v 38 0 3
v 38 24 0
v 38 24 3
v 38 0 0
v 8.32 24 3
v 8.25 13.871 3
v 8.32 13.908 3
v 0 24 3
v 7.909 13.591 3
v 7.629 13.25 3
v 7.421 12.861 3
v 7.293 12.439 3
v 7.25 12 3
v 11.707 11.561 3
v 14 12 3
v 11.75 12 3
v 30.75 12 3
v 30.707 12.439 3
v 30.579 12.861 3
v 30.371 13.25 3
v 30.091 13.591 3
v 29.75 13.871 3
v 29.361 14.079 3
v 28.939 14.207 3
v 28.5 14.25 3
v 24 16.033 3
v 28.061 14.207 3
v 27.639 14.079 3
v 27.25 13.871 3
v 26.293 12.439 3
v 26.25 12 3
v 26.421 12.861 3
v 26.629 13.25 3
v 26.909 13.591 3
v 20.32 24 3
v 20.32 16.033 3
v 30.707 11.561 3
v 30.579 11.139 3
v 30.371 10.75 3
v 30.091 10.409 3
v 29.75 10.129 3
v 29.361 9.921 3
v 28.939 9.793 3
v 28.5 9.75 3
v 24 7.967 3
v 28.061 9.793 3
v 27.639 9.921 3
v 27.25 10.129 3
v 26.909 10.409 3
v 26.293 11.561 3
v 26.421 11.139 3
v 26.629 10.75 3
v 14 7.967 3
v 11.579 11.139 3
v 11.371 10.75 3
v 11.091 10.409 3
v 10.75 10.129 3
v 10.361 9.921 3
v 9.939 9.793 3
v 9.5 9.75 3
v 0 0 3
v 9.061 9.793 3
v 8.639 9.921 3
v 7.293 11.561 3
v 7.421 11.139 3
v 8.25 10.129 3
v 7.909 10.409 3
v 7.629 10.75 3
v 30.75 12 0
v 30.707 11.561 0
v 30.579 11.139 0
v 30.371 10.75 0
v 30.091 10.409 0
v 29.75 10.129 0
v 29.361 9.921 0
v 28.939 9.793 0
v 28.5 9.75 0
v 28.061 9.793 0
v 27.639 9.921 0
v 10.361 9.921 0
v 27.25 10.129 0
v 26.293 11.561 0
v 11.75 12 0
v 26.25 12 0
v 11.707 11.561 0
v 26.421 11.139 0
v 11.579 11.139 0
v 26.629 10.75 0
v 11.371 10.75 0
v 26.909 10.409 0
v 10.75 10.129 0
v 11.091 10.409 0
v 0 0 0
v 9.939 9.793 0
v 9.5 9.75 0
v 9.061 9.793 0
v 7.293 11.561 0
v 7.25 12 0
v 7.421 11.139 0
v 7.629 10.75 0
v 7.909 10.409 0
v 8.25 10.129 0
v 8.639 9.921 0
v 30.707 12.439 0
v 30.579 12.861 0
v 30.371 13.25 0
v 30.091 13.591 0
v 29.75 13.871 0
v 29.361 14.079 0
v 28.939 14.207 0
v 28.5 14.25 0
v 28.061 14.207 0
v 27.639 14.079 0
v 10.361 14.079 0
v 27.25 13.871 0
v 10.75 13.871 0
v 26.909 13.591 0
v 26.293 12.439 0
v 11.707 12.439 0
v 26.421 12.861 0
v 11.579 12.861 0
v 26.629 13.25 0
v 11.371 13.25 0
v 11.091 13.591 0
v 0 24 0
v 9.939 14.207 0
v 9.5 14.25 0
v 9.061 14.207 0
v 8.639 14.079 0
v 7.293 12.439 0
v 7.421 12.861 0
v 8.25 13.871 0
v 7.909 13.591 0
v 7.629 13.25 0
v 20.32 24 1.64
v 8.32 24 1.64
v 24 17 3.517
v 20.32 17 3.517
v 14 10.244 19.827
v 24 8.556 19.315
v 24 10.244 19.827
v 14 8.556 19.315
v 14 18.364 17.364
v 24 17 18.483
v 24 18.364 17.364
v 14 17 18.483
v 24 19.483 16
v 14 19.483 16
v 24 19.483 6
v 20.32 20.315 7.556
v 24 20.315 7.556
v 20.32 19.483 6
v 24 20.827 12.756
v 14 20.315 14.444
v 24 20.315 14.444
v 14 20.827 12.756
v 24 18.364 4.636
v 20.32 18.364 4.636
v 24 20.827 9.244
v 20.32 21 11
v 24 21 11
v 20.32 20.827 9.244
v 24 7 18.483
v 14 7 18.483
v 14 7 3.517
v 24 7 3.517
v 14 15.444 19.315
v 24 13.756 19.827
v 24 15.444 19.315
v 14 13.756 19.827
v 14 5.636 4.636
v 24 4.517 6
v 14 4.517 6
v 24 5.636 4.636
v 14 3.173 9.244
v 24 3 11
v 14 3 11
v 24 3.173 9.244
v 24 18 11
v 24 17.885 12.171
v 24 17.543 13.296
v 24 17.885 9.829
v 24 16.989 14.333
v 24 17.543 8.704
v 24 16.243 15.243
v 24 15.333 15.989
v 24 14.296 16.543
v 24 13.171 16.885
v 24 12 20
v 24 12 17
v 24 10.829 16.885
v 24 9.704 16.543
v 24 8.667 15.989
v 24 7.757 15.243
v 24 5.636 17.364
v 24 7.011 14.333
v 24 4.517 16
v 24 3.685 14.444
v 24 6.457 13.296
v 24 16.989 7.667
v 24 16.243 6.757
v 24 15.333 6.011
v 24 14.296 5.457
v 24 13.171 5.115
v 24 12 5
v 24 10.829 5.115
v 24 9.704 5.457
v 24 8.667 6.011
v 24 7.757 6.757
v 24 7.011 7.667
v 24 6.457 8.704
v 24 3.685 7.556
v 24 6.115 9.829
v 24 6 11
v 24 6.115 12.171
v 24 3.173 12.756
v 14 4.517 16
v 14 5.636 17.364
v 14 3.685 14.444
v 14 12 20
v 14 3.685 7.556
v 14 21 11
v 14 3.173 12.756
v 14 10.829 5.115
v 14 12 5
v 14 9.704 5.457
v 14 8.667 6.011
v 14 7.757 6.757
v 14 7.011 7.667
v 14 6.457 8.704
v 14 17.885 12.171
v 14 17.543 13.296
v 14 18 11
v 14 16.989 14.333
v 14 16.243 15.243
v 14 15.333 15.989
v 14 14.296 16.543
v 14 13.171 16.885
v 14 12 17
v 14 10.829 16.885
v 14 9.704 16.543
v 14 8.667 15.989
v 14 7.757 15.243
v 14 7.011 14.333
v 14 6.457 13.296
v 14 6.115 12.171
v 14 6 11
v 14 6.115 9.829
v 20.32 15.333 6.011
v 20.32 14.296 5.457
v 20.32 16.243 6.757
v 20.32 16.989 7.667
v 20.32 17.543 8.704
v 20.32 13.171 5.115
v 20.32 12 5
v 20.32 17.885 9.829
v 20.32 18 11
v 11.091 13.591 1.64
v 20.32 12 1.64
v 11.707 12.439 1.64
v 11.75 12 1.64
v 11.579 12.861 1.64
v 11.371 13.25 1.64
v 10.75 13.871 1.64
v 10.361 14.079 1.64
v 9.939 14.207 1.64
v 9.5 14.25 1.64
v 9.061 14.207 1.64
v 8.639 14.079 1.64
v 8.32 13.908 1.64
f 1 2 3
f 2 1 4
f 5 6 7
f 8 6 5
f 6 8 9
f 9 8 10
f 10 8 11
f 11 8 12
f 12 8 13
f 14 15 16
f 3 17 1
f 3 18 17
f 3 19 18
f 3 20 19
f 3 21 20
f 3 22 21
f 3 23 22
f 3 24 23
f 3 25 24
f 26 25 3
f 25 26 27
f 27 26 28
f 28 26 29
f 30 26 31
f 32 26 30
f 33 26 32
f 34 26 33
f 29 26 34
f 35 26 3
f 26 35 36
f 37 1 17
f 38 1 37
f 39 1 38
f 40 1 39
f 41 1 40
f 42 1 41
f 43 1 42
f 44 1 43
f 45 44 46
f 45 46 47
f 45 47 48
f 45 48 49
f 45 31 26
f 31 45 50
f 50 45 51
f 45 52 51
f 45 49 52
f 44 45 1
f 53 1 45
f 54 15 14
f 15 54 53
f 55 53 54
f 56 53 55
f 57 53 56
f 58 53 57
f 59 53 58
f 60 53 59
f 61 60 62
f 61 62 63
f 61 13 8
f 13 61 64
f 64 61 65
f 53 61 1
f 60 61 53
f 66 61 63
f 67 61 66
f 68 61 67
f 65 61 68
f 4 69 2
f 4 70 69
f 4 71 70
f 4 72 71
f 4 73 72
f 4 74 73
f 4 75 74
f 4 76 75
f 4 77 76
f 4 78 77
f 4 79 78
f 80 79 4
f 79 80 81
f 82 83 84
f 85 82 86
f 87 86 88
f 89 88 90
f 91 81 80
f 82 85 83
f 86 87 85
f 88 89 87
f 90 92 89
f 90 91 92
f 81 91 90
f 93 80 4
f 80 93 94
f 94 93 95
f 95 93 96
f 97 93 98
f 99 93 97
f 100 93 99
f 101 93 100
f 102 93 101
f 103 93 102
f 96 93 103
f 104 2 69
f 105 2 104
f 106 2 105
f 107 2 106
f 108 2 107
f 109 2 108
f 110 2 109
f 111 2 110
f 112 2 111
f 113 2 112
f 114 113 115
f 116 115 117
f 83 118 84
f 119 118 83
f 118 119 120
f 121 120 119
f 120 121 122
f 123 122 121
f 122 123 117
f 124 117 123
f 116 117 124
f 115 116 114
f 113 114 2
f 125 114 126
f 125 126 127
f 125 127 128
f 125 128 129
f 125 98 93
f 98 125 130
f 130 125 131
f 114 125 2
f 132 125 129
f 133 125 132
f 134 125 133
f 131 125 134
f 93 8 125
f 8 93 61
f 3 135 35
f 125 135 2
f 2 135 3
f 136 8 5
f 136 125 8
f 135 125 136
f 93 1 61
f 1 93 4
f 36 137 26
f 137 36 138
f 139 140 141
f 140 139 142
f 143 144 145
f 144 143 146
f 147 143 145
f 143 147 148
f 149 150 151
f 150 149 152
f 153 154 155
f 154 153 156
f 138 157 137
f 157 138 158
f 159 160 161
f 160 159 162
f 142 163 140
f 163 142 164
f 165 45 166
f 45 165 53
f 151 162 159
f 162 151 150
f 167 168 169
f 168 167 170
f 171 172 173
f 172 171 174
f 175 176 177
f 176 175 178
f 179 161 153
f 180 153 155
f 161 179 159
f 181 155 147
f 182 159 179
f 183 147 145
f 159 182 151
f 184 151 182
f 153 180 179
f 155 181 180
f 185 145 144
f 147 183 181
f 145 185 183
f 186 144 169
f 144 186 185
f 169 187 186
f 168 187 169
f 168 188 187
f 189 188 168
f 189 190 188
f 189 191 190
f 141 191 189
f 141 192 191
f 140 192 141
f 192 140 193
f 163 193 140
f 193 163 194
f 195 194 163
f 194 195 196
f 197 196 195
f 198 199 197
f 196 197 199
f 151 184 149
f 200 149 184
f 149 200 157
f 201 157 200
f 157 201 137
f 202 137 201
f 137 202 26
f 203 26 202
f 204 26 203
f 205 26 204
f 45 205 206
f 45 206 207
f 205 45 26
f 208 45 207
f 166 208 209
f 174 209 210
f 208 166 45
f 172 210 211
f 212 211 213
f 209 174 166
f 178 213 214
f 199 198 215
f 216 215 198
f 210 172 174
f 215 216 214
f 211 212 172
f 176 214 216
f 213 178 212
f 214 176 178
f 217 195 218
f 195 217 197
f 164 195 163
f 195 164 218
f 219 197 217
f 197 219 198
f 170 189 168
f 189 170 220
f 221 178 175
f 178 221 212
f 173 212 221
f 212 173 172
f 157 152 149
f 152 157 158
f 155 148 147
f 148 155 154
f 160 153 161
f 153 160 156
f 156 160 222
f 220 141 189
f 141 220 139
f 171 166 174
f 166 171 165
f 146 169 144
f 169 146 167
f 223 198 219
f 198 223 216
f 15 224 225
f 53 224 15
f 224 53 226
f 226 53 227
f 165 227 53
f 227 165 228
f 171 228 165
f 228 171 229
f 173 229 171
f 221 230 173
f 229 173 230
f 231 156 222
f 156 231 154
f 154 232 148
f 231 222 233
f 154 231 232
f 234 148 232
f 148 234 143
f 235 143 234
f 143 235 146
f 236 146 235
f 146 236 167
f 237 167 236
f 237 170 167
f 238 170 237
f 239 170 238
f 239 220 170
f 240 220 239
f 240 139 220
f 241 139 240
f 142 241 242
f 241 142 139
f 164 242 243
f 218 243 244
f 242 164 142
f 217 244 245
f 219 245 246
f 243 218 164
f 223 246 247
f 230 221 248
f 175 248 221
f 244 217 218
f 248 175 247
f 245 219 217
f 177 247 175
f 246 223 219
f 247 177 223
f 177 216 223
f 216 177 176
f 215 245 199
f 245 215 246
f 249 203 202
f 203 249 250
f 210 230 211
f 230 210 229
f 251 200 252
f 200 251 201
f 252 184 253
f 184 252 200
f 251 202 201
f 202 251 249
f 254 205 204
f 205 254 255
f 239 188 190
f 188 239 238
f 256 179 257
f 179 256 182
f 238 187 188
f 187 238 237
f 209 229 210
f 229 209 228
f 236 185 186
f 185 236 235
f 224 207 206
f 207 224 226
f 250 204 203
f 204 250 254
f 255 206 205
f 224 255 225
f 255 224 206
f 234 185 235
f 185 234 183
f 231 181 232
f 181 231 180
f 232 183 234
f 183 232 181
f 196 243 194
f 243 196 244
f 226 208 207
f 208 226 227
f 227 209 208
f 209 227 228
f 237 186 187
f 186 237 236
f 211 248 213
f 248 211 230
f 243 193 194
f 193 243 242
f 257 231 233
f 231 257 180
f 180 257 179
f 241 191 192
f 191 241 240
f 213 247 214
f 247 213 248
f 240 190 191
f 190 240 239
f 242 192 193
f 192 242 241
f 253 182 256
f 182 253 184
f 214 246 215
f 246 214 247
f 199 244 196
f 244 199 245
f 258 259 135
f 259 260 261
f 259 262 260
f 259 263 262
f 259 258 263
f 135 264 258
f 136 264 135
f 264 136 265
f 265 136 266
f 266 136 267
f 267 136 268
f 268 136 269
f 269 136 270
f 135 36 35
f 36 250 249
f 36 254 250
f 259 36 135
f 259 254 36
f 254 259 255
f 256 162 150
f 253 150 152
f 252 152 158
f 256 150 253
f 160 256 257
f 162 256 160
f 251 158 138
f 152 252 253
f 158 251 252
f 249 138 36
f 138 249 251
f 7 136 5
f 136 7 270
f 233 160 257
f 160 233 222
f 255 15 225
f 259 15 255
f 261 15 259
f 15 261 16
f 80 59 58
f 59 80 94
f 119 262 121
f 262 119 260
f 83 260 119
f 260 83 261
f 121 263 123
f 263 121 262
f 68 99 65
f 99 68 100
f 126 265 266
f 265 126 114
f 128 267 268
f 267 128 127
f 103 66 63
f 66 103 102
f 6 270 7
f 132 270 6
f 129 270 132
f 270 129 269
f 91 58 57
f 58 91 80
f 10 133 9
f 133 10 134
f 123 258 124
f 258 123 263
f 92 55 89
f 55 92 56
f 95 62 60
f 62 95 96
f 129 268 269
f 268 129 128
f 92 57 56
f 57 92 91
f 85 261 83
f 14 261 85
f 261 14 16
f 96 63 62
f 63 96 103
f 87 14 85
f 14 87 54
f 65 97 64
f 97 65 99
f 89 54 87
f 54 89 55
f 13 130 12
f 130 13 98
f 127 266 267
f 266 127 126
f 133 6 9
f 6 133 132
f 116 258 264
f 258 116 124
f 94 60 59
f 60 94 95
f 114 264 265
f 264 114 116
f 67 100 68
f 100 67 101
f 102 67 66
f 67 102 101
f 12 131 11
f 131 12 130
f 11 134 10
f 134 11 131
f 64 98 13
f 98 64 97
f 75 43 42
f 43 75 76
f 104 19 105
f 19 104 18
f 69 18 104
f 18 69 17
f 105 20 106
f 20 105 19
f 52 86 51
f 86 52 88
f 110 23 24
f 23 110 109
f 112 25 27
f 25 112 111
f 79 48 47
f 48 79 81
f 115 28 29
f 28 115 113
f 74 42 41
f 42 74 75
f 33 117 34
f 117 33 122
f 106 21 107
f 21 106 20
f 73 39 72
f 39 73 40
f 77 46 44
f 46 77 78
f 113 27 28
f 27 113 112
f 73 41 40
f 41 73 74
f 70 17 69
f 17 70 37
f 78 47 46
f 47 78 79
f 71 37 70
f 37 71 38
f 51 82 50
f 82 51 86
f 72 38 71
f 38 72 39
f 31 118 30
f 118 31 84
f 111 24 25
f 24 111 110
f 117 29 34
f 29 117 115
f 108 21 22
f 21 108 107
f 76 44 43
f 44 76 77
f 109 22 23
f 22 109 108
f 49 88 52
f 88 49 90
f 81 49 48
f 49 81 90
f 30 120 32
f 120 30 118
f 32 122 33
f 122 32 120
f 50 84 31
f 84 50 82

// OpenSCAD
$fn = 32;

// ----------------------------------------------------------------------
// Cable clip: cable 12 mm, clamp 18 mm, base 38 mm
// ----------------------------------------------------------------------

// --- parameters (mm) ---
plate_x = 38;             // base length, X
plate_y = 24;             // base width, Y
plate_t = 3;              // base thickness
wire_seat_d = 18;         // clamp outside diameter
clip_t = 3;               // clamp wall
cable_d = 12;             // cable opening
ring_w = 10;              // clamp width along the cable
screw_d = 4.5;            // screw clearance
throat = 9.36;            // snap throat width
sink = 1;                 // overlap of the clamp into the base

module base() {
  cube([plate_x, plate_y, plate_t]);
}

module clamp() {
  translate([plate_x / 2, plate_y / 2, plate_t + wire_seat_d / 2 - sink]) rotate([0, 90, 0])
    cylinder(h = ring_w, d = wire_seat_d, center = true);
}

difference() {
  union() {
    base();
    clamp();
  }
  translate([plate_x / 2, plate_y / 2, plate_t + wire_seat_d / 2 - sink]) rotate([0, 90, 0]) translate([0, 0, -ring_w / 2 - 1]) cylinder(h = ring_w + 2, d = cable_d);
  /* snap throat: the opening is narrower than the cable */
  translate([plate_x / 2 - throat / 2, plate_y / 2, plate_t + wire_seat_d / 2 - sink]) rotate([0, 90, 0]) translate([0, 0, -ring_w / 2 - 1]) cube([throat, wire_seat_d + 2, ring_w + 2]);
  translate([9.5, plate_y / 2, -1]) cylinder(h = plate_t + 2, d = screw_d);
  translate([28.5, plate_y / 2, -1]) cylinder(h = plate_t + 2, d = screw_d);
}
